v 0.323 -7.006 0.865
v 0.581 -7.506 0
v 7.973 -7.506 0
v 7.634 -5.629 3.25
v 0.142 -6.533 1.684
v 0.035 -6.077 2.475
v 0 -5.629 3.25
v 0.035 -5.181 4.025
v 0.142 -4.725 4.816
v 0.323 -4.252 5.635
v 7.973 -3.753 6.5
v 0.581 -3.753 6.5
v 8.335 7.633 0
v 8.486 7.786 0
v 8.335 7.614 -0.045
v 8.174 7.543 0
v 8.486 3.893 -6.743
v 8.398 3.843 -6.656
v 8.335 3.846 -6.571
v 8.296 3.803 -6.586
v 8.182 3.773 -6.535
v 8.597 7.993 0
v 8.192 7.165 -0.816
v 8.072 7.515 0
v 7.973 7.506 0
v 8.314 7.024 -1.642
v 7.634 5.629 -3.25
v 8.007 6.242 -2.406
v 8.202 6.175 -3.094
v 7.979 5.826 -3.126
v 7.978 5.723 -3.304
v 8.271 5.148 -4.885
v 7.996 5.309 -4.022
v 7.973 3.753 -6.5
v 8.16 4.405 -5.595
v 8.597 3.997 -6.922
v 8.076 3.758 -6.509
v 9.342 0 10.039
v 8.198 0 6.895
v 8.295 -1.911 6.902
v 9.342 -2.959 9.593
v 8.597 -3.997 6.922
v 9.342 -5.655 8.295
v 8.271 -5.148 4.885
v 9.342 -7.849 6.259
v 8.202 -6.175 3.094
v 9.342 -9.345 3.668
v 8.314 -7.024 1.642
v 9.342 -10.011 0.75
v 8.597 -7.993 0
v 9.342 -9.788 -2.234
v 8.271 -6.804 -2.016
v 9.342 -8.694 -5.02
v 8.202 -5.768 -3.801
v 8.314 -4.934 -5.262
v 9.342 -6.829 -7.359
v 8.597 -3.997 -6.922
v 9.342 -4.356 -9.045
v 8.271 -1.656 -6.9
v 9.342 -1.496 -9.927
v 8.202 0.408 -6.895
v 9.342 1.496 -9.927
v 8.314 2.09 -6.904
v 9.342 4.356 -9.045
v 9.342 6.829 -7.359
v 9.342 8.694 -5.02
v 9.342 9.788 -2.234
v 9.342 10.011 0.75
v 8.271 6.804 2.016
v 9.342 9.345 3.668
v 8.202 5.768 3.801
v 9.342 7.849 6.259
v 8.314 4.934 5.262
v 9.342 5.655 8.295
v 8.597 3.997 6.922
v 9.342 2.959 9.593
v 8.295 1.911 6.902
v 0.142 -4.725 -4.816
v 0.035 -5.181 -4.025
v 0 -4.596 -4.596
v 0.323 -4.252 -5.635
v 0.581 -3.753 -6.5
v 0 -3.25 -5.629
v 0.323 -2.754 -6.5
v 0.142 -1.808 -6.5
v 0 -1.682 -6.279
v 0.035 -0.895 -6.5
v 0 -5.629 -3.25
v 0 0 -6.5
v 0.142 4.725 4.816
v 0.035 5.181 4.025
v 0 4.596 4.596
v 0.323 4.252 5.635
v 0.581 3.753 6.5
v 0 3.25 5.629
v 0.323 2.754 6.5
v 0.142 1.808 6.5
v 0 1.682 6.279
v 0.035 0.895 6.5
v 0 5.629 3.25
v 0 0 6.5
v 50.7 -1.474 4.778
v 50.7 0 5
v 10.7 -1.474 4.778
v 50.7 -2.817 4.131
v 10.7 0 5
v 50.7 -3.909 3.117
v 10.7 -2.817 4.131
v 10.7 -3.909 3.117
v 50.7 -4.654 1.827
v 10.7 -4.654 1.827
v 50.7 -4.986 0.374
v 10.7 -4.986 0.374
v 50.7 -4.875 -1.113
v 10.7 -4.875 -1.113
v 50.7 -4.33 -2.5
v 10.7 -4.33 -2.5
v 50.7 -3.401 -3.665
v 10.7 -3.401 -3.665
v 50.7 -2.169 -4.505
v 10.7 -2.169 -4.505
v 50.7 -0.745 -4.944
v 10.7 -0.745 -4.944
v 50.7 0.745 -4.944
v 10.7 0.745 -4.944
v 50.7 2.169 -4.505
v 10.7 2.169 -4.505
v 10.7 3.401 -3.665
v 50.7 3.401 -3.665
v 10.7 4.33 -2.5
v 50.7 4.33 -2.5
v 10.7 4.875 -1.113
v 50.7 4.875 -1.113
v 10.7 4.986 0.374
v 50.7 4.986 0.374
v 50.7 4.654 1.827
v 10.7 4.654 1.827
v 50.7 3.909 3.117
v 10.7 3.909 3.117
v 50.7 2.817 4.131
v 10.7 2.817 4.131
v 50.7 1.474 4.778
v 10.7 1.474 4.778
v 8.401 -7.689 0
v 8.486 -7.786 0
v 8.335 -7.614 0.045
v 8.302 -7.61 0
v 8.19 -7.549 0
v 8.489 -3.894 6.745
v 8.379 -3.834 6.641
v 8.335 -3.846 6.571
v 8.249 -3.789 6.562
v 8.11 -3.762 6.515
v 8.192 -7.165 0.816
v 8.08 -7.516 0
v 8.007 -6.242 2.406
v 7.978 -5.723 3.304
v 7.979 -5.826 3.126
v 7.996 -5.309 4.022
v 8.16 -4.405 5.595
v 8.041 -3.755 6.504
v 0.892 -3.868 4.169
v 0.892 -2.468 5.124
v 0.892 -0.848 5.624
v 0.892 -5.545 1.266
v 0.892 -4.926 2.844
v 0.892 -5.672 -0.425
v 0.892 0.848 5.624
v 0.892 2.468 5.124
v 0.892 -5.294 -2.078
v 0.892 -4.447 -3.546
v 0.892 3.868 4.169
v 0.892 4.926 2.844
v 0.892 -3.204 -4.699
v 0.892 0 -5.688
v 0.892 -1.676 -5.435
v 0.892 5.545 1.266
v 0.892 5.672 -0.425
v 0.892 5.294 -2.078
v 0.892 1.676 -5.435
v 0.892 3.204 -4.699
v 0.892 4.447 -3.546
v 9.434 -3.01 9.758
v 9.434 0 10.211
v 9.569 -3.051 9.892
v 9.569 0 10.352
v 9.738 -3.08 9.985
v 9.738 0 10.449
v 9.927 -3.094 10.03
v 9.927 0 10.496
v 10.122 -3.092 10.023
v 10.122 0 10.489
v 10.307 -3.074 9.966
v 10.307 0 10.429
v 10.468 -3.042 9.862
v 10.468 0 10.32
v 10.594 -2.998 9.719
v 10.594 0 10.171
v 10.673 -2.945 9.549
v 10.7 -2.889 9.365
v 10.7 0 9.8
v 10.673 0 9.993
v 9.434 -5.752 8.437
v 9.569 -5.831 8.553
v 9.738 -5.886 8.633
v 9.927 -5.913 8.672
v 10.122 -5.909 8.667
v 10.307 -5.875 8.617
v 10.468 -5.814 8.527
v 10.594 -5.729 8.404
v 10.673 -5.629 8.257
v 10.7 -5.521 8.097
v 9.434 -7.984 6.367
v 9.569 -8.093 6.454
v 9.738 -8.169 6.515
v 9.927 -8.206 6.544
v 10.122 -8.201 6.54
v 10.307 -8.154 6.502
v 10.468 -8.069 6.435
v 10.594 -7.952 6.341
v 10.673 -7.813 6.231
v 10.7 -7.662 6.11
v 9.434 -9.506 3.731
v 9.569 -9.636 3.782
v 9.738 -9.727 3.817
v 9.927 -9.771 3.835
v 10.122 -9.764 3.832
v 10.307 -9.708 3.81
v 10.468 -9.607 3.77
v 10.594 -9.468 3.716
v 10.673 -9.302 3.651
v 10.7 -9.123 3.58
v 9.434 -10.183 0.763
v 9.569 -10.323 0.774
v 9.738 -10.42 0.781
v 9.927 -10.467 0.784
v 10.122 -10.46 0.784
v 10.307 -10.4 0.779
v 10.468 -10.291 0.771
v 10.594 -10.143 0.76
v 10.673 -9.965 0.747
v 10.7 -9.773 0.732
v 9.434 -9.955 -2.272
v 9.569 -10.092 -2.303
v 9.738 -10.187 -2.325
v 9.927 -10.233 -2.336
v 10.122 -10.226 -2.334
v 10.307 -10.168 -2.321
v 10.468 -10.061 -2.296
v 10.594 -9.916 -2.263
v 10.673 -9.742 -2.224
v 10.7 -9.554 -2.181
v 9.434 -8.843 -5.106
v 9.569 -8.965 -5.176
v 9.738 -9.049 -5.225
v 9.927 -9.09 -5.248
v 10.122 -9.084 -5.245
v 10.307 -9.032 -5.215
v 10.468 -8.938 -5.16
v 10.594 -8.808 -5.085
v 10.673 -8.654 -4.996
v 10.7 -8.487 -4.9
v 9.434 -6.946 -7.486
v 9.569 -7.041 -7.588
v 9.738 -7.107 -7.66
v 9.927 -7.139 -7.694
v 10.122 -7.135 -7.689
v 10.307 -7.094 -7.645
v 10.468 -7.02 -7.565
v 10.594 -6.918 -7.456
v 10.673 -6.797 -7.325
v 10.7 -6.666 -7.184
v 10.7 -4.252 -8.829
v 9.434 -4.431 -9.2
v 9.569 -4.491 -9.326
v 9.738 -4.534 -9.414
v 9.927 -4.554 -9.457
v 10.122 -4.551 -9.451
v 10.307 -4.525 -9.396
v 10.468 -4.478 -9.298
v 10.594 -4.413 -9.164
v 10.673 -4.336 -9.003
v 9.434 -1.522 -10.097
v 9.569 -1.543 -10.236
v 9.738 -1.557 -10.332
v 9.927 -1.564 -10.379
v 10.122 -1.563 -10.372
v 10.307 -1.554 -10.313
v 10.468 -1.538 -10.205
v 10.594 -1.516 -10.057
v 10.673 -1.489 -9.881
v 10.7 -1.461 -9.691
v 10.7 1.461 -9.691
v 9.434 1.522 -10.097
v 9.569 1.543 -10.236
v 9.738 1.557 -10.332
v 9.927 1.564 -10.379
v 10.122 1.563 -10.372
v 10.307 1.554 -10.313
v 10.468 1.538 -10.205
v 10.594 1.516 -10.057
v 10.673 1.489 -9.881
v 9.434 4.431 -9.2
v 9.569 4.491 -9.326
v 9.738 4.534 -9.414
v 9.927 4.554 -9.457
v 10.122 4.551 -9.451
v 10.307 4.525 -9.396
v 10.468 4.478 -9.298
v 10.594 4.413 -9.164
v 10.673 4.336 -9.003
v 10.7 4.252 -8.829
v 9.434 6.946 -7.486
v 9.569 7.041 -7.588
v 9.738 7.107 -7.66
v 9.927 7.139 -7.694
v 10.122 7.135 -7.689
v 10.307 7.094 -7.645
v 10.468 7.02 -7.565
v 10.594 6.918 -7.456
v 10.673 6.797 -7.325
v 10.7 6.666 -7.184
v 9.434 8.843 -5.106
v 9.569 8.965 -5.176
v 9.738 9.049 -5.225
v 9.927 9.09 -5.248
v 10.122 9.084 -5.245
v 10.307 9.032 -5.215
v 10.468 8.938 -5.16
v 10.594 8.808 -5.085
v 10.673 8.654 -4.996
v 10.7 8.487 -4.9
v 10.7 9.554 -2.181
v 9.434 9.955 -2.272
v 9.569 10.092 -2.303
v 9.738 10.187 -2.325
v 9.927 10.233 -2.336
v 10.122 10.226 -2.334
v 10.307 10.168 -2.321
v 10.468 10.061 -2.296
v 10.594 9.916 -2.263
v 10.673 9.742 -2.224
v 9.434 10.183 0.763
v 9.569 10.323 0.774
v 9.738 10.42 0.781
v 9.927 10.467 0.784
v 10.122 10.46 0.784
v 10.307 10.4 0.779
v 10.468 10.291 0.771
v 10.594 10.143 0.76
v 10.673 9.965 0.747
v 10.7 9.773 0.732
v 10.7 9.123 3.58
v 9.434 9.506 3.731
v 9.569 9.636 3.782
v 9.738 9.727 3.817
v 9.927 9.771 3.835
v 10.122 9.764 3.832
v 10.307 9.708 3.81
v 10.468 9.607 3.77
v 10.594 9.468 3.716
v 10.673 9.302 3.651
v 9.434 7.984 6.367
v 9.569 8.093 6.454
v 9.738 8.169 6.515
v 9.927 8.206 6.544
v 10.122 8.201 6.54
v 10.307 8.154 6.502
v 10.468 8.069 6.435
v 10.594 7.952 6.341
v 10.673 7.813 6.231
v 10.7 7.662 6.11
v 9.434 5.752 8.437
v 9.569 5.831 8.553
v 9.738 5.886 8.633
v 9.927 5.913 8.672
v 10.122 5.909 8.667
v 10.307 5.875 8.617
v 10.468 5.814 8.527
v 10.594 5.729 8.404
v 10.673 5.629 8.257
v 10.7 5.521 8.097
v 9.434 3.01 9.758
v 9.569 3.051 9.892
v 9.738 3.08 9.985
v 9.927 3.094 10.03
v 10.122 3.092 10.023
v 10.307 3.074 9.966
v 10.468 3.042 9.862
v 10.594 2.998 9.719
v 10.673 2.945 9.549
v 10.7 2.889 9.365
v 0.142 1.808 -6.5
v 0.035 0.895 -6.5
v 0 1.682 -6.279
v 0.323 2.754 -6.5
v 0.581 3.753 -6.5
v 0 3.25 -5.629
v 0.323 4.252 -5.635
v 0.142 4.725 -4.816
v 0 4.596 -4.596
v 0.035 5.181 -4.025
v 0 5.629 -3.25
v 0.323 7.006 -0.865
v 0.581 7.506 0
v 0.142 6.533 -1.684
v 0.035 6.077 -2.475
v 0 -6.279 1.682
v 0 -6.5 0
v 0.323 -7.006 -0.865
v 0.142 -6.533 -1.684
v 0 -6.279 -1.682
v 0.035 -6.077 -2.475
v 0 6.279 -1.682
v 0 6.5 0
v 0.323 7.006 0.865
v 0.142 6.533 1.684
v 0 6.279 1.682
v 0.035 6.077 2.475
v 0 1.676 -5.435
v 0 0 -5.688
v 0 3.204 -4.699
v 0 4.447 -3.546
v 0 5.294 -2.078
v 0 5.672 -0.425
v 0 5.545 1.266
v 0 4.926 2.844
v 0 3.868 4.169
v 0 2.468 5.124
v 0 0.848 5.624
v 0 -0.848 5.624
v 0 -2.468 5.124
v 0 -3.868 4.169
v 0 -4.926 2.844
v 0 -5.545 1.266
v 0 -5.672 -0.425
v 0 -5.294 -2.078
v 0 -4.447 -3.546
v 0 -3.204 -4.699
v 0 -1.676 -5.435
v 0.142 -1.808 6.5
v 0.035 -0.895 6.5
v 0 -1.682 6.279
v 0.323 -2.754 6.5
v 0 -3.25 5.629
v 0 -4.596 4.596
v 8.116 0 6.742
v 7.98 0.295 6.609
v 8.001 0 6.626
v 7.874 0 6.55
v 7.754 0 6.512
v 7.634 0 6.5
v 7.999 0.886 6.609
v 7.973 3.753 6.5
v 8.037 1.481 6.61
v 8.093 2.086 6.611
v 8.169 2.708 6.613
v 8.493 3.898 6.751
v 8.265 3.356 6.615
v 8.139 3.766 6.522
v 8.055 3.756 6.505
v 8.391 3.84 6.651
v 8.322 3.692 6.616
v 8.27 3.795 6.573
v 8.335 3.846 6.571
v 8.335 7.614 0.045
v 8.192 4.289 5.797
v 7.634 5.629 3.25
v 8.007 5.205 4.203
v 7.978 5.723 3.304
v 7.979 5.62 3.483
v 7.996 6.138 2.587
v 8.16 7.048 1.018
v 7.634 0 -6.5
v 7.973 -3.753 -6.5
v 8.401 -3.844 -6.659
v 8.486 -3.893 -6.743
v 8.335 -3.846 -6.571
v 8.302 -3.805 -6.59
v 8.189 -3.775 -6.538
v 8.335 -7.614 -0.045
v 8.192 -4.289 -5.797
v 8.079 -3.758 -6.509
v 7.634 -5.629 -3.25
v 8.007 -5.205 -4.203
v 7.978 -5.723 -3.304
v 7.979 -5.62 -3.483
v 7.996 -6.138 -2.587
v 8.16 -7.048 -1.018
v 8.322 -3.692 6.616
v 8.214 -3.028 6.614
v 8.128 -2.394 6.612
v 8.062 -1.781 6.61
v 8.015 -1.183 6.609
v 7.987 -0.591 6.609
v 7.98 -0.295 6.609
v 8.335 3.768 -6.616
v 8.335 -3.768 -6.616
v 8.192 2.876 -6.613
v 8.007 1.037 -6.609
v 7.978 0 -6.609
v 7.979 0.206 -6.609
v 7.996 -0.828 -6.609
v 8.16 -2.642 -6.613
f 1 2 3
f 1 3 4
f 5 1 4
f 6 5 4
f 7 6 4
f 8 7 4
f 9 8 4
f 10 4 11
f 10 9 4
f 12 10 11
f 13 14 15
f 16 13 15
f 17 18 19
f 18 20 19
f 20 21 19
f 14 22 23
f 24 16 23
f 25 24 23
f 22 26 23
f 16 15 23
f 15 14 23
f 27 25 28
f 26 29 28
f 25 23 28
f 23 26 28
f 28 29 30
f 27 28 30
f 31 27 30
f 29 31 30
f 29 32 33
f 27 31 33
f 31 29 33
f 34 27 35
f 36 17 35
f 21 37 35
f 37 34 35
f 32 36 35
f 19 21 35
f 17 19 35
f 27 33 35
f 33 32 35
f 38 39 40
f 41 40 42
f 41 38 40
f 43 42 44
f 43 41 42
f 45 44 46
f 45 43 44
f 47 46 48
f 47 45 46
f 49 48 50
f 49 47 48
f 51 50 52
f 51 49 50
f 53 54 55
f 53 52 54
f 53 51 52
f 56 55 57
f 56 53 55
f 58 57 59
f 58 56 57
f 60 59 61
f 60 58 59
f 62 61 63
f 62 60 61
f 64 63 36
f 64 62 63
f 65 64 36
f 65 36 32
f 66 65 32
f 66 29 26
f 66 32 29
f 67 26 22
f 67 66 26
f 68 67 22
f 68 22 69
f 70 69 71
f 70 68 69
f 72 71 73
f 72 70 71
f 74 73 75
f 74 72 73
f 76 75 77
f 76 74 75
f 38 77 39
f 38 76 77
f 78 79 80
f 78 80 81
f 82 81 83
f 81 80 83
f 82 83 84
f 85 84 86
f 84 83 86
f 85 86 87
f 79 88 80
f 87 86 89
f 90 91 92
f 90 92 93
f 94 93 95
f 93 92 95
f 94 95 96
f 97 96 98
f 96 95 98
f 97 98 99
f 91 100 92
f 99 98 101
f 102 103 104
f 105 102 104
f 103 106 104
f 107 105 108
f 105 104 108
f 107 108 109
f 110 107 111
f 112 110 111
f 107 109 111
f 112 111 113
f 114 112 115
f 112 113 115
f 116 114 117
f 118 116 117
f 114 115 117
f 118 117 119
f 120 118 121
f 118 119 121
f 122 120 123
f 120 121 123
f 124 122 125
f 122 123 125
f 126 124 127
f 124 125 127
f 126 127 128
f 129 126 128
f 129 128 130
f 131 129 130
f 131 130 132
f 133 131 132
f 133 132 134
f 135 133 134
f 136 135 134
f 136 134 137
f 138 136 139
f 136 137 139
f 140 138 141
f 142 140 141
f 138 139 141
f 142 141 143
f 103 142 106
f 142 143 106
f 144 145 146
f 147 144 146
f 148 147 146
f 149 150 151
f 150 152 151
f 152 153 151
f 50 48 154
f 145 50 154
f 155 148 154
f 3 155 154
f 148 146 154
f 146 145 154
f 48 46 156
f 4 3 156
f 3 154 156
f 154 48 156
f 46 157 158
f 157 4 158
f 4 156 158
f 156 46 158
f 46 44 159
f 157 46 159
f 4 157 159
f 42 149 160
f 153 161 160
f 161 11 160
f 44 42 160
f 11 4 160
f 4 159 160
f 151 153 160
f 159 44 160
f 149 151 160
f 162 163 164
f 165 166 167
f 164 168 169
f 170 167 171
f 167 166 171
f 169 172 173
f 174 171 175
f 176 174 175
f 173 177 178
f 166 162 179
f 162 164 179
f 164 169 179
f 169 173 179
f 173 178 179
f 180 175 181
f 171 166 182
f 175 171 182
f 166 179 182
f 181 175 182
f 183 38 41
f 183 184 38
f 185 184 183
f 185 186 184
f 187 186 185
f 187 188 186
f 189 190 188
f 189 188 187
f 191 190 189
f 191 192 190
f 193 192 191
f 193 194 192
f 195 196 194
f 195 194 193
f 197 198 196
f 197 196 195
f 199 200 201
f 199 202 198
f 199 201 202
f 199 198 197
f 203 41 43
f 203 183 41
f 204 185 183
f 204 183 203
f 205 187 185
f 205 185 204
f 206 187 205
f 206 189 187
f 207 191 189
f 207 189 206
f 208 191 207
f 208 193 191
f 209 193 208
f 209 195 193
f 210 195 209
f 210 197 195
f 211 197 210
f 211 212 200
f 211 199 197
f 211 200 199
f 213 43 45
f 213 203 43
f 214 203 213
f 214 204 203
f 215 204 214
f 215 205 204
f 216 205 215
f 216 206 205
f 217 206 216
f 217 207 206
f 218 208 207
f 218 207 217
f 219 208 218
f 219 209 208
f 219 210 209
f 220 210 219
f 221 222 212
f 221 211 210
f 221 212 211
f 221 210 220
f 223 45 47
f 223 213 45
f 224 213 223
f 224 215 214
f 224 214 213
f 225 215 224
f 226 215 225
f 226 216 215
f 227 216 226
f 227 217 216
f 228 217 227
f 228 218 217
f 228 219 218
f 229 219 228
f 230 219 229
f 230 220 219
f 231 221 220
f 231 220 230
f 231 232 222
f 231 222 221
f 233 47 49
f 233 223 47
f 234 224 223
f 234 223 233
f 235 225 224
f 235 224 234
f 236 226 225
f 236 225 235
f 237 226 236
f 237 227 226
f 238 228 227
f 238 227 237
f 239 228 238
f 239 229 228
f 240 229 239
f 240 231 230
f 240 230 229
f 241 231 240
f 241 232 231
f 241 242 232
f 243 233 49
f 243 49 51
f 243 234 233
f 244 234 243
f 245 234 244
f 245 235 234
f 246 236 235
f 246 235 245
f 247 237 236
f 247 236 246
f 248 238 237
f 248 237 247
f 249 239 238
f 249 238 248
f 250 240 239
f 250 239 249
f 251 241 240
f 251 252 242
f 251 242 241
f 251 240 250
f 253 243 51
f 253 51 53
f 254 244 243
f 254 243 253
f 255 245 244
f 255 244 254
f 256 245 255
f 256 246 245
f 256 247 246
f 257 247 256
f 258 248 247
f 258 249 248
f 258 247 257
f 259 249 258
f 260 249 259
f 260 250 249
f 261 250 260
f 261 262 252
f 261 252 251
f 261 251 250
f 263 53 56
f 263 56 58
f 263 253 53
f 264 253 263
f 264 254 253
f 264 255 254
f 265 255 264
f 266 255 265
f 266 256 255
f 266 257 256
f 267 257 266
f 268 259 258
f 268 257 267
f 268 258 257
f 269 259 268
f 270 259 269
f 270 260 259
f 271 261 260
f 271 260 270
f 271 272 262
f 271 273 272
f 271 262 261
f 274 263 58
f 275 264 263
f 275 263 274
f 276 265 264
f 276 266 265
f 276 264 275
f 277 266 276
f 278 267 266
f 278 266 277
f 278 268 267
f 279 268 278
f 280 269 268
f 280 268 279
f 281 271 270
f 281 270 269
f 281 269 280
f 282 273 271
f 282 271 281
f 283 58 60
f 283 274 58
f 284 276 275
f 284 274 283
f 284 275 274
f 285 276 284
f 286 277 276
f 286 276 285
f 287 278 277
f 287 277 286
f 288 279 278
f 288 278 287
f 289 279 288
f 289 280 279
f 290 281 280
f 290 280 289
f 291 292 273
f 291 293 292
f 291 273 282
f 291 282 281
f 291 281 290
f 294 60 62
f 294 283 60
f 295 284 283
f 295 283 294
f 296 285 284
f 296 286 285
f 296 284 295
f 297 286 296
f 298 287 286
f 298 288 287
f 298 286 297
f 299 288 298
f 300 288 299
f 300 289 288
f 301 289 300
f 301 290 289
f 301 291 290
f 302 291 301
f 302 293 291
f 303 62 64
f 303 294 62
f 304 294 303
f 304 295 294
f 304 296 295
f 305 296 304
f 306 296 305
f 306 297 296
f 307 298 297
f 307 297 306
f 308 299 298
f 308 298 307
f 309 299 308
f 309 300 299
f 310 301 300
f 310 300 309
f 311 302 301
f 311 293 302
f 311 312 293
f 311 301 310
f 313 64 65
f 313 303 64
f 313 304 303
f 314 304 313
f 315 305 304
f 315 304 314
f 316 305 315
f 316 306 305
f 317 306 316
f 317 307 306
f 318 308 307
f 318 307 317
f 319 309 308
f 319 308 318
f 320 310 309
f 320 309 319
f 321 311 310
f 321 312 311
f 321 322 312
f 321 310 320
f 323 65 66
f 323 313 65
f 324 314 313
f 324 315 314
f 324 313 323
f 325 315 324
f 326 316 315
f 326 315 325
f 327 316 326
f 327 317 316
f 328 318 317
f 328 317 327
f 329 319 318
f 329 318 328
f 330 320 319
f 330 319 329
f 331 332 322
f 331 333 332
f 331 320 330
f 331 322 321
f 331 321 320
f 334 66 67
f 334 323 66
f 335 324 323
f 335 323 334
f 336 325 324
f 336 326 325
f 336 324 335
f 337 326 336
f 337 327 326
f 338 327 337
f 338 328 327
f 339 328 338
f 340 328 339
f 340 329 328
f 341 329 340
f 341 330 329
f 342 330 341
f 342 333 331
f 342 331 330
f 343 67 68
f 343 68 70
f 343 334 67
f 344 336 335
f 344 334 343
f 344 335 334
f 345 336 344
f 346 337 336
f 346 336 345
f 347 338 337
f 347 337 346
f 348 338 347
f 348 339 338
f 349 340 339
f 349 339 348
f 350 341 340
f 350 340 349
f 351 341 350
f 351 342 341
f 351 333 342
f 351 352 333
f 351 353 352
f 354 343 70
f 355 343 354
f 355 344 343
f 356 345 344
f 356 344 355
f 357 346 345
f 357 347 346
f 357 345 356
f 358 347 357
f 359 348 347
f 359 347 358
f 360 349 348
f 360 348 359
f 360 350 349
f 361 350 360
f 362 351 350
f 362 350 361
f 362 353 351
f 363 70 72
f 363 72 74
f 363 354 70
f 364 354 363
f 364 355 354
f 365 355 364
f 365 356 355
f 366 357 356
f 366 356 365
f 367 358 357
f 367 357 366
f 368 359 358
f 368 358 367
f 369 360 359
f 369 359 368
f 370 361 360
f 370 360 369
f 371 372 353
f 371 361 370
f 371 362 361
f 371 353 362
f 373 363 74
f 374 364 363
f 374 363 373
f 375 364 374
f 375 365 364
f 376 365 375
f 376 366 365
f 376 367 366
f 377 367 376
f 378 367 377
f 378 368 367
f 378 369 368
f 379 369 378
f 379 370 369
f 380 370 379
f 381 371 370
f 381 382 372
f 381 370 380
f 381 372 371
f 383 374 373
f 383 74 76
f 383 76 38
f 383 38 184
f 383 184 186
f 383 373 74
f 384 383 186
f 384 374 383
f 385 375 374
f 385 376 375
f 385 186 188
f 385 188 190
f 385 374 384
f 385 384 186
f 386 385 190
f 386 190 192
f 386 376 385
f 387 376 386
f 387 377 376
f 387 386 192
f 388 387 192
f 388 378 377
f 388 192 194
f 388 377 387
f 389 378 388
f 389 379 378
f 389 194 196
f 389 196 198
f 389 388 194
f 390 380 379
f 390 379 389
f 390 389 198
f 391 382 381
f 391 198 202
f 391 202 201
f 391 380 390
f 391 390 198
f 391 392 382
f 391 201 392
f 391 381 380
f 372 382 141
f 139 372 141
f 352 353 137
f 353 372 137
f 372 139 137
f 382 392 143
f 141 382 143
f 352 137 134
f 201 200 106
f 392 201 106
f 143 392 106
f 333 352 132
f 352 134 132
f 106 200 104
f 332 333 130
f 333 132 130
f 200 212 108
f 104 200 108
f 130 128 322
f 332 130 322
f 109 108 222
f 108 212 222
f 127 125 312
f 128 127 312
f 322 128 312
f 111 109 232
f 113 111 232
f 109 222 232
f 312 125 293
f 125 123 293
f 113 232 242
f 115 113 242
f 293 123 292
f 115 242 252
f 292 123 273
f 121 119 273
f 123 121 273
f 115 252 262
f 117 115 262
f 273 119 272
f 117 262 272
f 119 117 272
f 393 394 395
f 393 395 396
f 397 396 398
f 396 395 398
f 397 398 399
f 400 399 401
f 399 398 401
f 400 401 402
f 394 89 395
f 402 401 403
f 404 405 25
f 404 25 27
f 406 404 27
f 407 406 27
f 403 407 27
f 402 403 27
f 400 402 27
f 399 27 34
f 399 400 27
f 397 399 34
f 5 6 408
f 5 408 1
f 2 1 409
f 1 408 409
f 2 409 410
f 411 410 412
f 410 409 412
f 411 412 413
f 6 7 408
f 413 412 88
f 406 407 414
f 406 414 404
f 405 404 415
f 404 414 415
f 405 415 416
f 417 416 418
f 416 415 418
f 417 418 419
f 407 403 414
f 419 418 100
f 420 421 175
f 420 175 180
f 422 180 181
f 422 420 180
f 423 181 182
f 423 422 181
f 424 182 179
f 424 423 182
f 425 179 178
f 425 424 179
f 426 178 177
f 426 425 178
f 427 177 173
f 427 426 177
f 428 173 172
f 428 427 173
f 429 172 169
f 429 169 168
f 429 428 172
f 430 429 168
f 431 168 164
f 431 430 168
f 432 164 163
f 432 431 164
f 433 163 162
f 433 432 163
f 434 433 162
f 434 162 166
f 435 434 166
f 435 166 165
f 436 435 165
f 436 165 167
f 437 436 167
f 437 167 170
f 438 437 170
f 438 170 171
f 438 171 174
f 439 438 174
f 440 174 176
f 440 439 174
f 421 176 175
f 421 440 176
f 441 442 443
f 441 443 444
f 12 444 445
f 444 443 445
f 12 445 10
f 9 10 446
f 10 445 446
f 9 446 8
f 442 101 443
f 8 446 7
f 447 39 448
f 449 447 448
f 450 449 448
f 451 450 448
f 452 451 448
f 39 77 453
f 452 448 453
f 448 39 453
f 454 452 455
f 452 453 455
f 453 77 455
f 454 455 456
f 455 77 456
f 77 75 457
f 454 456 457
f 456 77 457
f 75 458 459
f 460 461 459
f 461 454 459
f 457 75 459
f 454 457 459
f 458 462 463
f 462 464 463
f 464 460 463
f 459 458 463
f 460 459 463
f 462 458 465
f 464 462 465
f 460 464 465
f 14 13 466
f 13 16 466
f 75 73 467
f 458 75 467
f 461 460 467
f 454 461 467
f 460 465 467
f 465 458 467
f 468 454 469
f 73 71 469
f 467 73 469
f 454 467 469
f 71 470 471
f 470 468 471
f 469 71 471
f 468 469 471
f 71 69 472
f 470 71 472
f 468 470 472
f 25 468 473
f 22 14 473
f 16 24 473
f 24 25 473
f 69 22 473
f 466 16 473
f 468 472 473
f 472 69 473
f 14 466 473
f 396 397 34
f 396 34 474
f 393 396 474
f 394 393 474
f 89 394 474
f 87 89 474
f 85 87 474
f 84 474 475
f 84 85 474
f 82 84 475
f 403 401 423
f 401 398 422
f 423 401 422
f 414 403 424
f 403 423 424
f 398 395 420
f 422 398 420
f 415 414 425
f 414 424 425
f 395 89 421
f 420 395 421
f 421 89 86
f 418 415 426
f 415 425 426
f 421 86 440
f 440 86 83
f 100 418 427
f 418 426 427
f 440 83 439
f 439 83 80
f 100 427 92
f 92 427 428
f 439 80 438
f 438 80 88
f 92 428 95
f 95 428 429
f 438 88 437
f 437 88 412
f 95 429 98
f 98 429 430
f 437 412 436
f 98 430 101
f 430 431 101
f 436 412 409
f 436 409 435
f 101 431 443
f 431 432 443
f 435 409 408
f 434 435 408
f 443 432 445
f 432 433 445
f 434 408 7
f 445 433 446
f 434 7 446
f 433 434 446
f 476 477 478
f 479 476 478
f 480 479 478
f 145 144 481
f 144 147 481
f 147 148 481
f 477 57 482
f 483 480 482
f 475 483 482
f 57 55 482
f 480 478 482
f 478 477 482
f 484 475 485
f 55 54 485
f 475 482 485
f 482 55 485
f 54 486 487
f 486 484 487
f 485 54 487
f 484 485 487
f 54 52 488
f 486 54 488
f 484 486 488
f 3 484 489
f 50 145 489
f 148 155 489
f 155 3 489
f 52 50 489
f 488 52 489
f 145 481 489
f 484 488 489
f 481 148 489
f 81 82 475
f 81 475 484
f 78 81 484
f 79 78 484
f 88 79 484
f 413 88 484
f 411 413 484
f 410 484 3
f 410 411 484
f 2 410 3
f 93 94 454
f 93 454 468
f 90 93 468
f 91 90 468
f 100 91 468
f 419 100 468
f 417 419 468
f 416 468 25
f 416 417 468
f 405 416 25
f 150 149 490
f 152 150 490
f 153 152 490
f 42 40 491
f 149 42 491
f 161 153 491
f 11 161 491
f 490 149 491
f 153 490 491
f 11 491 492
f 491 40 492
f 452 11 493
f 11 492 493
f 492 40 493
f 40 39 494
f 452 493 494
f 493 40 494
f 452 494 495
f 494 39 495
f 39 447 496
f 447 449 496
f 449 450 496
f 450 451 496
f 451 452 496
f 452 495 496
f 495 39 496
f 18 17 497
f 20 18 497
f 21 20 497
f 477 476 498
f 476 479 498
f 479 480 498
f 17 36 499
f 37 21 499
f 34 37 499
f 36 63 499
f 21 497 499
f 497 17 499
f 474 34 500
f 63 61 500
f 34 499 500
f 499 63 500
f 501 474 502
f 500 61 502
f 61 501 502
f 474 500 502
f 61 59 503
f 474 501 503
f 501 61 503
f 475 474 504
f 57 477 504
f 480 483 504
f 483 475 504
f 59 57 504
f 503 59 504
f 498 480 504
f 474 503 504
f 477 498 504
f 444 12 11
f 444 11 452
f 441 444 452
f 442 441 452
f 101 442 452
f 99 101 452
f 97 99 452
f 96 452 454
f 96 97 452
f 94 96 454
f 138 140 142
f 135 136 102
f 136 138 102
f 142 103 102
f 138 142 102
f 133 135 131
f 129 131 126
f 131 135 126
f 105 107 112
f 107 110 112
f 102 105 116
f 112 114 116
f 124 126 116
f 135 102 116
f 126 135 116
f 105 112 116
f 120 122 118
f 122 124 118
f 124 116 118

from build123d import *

# Parameters (mm, degrees)
HEX_DIE_START     = -1e-06
SKETCH2_R         = 7.580831409
HEX_DIE_DEPTH     = 10.700001
FLANGEHEXFILLET_R = 0.6
SKETCH4_R         = 5.6875
INDENT_DEPTH      = 0.891666667


with BuildPart() as part:
    # BodySke → Base-Revolve (revolve)
    with BuildSketch(Plane.XY, mode=Mode.PRIVATE) as base_revolve_sk:
        Polygon((10.7, 5), (10.7, 7.505773672), (0.5806837, 7.505773672), (0, 6.5), (0, 0), (50.7, 0), (50.7, 5), align=None)
    revolve(base_revolve_sk.sketch.rotate(Axis((-25.4, 0, 0), (1, 0, 0)), 90), axis=Axis((-25.4, 0, 0), (1, 0, 0)))

    # Sketch2 → Hex-Die (cut)
    with BuildSketch(Plane(origin=(0, 0, 0), x_dir=(0, 0, -1), z_dir=(1, 0, 0)).offset(HEX_DIE_START)):
        Circle(SKETCH2_R)
        Polygon((-6.5, 3.752776766), (0, 7.505553532), (6.5, 3.752776766), (6.5, -3.752776766), (0, -7.505553532), (-6.5, -3.752776766), align=None, mode=Mode.SUBTRACT)
    extrude(amount=HEX_DIE_DEPTH, mode=Mode.SUBTRACT)

    # Sketch5 → Flange (revolve)
    with BuildSketch(Plane.XY, mode=Mode.PRIVATE) as flange_sk:
        with BuildLine():
            Line((5.688167263, 0), (9.342215165, 10.0394141))
            ThreePointArc((9.342215165, 10.0394141), (10.121553724, 10.489365427), (10.7, 9.8))
            Line((10.7, 9.8), (10.7, 0))
            Line((10.7, 0), (5.688167263, 0))
        make_face()
    revolve(flange_sk.sketch.rotate(Axis((0, 0, 0), (1, 0, 0)), 90), axis=Axis((0, 0, 0), (1, 0, 0)))

    # FlangeHexFillet
    flangehexfillet_edges = [part.edges().sort_by_distance(p)[0] for p in [
        (8.151404722, 1.884573799, 6.5),
        (8.053973794, 5.629165149, 3.25),
        (8.053973794, 5.629165149, -3.25),
        (8.053973786, 0, -6.5),
        (8.053973794, -5.629165149, -3.25),
        (8.053973794, -5.629165149, 3.25),
        (8.151404722, -1.884573799, 6.5),
    ]]
    fillet(flangehexfillet_edges, radius=FLANGEHEXFILLET_R)

    # Sketch4 → Indent (cut)
    with BuildSketch(Plane(origin=(0, 0, 0), x_dir=(0, 0, -1), z_dir=(1, 0, 0))):
        Circle(SKETCH4_R)
    extrude(amount=INDENT_DEPTH, mode=Mode.SUBTRACT)


solid = part.part
